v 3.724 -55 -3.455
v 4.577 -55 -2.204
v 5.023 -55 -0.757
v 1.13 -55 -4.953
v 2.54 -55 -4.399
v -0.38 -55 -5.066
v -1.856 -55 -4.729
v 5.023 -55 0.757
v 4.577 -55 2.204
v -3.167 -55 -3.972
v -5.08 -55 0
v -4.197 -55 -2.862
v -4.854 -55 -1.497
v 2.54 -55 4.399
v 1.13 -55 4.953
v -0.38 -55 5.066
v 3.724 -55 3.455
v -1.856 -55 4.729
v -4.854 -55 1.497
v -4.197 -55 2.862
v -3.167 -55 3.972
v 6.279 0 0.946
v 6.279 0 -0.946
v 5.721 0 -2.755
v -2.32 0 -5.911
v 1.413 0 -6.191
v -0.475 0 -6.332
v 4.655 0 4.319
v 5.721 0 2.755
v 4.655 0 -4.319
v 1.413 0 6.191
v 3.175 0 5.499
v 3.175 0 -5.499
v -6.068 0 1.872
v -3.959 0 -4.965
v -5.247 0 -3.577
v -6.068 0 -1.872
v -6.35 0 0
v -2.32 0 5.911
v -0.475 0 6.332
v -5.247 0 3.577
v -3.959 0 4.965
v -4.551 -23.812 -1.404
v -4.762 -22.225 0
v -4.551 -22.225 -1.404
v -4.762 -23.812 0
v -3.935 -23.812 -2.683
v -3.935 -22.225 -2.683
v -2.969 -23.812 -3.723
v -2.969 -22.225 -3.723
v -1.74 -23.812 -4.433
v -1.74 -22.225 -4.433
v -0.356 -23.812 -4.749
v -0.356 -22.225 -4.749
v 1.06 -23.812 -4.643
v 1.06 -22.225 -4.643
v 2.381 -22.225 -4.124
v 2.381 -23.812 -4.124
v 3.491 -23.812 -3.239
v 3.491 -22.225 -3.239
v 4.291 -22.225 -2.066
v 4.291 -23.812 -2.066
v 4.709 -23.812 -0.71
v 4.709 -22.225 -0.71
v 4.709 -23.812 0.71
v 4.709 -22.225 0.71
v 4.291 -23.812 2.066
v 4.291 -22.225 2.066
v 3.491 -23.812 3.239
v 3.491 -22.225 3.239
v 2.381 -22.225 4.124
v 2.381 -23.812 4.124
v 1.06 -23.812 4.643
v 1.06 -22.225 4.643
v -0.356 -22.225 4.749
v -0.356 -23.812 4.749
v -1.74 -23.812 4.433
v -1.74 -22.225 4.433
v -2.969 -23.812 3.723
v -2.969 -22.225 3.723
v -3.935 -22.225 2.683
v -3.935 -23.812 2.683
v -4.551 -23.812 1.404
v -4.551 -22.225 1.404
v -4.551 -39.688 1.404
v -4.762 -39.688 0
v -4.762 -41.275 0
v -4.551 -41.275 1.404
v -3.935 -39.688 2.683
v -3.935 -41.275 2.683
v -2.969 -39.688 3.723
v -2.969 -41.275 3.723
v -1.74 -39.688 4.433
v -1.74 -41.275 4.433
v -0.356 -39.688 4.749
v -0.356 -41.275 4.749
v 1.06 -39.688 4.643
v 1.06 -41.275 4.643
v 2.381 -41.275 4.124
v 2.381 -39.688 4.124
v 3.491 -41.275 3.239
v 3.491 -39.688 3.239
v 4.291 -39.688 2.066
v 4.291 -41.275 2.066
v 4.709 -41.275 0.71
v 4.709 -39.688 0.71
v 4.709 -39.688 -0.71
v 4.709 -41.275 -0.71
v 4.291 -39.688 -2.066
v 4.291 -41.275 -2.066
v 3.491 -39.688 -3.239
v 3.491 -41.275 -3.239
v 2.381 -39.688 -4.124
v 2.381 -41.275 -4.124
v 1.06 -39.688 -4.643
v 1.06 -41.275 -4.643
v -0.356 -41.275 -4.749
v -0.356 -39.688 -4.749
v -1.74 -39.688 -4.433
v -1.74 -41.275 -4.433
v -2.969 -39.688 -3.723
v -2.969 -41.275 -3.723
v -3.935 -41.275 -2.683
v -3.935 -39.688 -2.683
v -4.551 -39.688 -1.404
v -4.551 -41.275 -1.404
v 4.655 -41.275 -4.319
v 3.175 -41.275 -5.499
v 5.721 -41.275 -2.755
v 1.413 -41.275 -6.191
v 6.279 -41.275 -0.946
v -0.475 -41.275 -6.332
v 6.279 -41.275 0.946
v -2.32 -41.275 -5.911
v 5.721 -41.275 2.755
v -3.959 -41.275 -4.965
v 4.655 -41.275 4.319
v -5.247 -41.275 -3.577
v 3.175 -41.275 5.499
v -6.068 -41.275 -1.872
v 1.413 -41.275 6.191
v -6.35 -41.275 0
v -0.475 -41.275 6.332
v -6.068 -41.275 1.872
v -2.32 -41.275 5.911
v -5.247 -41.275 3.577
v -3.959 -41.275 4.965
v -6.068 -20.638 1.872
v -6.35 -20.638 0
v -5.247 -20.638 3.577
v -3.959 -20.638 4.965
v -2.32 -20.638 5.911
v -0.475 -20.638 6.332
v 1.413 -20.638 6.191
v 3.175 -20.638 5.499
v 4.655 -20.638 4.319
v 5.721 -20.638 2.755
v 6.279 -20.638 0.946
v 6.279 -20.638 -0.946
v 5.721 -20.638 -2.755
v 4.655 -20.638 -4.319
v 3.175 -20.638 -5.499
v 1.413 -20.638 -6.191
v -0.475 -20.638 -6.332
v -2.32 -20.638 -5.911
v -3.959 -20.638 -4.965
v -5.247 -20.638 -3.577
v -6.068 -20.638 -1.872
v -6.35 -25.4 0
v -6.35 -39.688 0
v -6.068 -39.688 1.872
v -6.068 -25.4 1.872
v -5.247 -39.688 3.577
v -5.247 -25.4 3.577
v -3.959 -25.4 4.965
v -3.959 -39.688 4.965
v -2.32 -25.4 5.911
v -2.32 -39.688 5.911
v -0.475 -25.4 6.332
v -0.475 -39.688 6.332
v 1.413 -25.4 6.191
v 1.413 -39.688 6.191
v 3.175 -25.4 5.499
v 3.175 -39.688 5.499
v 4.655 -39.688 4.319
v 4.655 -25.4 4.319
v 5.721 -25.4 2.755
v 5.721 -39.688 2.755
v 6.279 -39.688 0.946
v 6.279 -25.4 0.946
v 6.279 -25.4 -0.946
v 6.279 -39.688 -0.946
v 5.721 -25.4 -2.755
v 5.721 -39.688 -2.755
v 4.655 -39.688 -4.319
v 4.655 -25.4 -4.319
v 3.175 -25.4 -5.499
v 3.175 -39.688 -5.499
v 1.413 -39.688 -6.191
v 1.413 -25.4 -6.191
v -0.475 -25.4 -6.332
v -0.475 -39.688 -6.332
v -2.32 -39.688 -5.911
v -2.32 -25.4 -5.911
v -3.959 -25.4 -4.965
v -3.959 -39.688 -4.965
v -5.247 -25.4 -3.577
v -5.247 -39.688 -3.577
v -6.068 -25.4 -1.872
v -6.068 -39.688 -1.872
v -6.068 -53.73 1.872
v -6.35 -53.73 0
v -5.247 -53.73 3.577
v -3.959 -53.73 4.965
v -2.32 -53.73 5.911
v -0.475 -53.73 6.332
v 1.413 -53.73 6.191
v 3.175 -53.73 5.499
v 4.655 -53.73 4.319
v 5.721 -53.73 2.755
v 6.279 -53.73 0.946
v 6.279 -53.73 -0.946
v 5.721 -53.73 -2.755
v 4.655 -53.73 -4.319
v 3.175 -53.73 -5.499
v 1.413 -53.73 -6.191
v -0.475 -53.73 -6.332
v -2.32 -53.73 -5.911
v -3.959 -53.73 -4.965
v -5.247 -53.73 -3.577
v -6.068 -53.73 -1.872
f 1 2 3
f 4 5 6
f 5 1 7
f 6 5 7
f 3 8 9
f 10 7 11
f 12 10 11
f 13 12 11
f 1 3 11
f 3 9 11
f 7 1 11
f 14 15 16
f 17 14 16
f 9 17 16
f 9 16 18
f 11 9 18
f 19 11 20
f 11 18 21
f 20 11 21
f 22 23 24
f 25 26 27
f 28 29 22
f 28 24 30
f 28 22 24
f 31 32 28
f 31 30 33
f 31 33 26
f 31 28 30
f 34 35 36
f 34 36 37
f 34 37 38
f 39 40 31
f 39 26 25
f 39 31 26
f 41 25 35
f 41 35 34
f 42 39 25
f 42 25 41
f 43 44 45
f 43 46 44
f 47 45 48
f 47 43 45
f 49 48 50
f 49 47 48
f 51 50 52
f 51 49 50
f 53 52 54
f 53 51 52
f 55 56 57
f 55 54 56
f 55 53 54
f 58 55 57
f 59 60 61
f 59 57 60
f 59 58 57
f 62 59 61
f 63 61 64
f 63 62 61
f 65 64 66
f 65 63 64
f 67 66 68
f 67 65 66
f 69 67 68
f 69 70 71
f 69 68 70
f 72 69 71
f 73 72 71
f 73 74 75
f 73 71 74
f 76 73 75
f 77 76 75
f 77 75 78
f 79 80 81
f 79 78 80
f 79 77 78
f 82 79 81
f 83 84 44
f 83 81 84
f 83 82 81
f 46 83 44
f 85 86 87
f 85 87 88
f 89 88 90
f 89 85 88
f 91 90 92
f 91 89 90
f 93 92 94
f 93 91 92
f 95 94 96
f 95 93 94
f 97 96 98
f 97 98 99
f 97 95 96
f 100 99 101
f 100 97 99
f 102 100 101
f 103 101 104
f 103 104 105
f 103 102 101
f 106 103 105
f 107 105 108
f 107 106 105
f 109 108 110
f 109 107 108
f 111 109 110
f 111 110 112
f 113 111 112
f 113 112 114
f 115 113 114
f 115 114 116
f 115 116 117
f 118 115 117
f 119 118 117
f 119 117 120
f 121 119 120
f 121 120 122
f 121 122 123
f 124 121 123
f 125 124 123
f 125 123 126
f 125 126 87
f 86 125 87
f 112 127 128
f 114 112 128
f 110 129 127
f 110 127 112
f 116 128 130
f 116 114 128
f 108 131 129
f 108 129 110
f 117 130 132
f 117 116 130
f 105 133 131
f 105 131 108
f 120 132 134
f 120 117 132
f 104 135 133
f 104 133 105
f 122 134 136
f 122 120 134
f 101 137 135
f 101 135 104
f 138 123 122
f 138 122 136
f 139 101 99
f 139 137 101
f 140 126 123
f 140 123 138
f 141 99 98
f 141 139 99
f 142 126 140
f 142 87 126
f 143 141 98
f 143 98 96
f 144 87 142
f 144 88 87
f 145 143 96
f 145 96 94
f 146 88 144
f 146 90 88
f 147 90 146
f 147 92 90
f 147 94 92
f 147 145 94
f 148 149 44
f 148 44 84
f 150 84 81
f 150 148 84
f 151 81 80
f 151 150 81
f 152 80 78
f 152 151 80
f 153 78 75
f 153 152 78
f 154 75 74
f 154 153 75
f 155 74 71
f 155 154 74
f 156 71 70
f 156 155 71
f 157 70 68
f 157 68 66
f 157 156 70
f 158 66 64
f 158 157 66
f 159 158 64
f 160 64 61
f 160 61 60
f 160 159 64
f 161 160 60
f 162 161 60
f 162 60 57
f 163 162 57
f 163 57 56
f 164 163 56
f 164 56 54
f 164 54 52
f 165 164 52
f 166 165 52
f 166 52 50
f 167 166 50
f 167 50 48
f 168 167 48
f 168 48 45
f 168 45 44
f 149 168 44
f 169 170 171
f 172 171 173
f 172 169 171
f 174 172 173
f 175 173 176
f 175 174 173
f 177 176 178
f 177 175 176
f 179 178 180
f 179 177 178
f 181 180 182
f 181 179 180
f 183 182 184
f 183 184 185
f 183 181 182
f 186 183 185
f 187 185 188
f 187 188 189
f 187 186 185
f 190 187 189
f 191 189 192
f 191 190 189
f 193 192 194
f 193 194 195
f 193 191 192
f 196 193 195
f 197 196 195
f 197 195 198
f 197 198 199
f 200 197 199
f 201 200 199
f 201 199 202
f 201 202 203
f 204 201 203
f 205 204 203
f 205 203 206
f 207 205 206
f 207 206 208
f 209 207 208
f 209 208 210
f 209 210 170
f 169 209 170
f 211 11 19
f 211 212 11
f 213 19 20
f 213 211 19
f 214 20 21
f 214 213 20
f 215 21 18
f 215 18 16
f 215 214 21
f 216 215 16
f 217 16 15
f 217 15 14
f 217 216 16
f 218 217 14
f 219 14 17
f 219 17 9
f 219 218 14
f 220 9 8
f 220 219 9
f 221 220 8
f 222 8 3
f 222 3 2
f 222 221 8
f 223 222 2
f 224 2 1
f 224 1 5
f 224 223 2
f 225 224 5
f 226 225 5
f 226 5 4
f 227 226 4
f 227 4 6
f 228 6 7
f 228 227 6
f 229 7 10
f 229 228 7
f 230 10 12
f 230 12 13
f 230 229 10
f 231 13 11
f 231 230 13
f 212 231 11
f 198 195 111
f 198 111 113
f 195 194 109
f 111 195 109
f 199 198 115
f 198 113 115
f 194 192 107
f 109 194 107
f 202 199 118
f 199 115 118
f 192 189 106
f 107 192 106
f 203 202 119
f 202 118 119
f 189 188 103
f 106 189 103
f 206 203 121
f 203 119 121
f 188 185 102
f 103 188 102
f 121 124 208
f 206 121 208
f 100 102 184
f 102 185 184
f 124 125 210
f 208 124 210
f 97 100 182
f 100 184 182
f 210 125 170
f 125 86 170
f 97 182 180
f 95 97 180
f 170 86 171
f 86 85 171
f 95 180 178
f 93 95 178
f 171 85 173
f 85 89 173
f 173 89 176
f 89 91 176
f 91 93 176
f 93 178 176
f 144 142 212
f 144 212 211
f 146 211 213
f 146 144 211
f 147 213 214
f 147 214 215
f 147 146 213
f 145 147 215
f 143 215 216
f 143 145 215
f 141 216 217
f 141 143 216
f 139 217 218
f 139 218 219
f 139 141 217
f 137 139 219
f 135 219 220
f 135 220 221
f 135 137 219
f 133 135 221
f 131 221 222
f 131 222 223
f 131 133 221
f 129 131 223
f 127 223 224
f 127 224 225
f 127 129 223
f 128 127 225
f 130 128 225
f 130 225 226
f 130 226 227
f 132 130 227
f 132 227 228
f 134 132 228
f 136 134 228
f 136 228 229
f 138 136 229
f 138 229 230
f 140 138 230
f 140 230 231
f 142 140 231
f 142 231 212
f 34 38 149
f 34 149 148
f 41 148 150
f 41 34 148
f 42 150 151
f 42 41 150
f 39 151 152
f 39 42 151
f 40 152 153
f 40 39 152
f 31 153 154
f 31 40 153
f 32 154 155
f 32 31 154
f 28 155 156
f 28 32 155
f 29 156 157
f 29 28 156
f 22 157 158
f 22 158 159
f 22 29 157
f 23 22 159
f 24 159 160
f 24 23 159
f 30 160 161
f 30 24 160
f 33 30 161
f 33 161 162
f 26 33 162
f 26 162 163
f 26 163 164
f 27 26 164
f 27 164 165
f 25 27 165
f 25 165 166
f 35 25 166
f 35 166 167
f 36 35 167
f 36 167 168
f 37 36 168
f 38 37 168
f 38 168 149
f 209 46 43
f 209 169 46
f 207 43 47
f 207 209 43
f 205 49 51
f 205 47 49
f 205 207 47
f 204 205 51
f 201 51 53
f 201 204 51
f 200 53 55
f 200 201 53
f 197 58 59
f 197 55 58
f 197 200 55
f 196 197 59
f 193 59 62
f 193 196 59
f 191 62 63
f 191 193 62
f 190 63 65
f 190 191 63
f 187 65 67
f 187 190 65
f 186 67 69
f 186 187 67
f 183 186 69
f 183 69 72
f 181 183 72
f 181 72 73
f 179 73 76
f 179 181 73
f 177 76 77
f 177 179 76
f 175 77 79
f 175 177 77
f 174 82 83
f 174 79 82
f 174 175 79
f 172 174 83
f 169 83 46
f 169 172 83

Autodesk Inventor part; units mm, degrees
ref_plane "YZ Plane" through (0, 0, 0) normal (1, 0, 0) x (0, 1, 0)
ref_plane "XZ Plane" through (0, 0, 0) normal (0, 1, 0) x (-1, 0, 0)
ref_plane "XY Plane" through (0, 0, 0) normal (0, 0, 1) x (1, 0, 0)
sketch "Sketch8" plane through (0, 0, 0) normal (0, 1, 0) x (-1, 0, 0)
  circle A0 centre (0, 0) radius 6.35 projected
  point P0 (0, 0)
extrude "Extrusion4" add sketch "Sketch8" against normal blind 55
chamfer "Chamfer2" distance 1.27 angle 45 1 edges at (6.35, -55, 0)
sketch "Sketch9" plane through (0, 0, 0) normal (0, 0, 1) x (1, 0, 0)
  line L0 (-6.35, 0) -> (-6.35, -53.73) projected
  line L1 (-4.7625, -22.225) -> (-4.7625, -23.8125)
  line L2 (-6.35, -25.4) -> (-6.35, -20.6375)
  line L3 (-6.35, -41.275) -> (-4.7625, -41.275)
  line L4 (-4.7625, -41.275) -> (-4.7625, -39.6875)
  line L5 (-4.7625, -39.6875) -> (-6.35, -39.6875)
  line L6 (-6.35, -39.6875) -> (-6.35, -41.275)
  line L7 (0, -64.476) -> (0, 10.746) projected
  line L8 (-4.7625, -22.225) -> (-6.35, -20.6375)
  line L9 (-4.7625, -23.8125) -> (-6.35, -25.4)
  point P0 (0, 0)
revolve "Revolution1" cut sketch "Sketch9" angle 360 about axis through (0, -10, 0) along (0, 1, 0)
properties part number "Crank shaft" material "Steel, High Strength Low Alloy"
